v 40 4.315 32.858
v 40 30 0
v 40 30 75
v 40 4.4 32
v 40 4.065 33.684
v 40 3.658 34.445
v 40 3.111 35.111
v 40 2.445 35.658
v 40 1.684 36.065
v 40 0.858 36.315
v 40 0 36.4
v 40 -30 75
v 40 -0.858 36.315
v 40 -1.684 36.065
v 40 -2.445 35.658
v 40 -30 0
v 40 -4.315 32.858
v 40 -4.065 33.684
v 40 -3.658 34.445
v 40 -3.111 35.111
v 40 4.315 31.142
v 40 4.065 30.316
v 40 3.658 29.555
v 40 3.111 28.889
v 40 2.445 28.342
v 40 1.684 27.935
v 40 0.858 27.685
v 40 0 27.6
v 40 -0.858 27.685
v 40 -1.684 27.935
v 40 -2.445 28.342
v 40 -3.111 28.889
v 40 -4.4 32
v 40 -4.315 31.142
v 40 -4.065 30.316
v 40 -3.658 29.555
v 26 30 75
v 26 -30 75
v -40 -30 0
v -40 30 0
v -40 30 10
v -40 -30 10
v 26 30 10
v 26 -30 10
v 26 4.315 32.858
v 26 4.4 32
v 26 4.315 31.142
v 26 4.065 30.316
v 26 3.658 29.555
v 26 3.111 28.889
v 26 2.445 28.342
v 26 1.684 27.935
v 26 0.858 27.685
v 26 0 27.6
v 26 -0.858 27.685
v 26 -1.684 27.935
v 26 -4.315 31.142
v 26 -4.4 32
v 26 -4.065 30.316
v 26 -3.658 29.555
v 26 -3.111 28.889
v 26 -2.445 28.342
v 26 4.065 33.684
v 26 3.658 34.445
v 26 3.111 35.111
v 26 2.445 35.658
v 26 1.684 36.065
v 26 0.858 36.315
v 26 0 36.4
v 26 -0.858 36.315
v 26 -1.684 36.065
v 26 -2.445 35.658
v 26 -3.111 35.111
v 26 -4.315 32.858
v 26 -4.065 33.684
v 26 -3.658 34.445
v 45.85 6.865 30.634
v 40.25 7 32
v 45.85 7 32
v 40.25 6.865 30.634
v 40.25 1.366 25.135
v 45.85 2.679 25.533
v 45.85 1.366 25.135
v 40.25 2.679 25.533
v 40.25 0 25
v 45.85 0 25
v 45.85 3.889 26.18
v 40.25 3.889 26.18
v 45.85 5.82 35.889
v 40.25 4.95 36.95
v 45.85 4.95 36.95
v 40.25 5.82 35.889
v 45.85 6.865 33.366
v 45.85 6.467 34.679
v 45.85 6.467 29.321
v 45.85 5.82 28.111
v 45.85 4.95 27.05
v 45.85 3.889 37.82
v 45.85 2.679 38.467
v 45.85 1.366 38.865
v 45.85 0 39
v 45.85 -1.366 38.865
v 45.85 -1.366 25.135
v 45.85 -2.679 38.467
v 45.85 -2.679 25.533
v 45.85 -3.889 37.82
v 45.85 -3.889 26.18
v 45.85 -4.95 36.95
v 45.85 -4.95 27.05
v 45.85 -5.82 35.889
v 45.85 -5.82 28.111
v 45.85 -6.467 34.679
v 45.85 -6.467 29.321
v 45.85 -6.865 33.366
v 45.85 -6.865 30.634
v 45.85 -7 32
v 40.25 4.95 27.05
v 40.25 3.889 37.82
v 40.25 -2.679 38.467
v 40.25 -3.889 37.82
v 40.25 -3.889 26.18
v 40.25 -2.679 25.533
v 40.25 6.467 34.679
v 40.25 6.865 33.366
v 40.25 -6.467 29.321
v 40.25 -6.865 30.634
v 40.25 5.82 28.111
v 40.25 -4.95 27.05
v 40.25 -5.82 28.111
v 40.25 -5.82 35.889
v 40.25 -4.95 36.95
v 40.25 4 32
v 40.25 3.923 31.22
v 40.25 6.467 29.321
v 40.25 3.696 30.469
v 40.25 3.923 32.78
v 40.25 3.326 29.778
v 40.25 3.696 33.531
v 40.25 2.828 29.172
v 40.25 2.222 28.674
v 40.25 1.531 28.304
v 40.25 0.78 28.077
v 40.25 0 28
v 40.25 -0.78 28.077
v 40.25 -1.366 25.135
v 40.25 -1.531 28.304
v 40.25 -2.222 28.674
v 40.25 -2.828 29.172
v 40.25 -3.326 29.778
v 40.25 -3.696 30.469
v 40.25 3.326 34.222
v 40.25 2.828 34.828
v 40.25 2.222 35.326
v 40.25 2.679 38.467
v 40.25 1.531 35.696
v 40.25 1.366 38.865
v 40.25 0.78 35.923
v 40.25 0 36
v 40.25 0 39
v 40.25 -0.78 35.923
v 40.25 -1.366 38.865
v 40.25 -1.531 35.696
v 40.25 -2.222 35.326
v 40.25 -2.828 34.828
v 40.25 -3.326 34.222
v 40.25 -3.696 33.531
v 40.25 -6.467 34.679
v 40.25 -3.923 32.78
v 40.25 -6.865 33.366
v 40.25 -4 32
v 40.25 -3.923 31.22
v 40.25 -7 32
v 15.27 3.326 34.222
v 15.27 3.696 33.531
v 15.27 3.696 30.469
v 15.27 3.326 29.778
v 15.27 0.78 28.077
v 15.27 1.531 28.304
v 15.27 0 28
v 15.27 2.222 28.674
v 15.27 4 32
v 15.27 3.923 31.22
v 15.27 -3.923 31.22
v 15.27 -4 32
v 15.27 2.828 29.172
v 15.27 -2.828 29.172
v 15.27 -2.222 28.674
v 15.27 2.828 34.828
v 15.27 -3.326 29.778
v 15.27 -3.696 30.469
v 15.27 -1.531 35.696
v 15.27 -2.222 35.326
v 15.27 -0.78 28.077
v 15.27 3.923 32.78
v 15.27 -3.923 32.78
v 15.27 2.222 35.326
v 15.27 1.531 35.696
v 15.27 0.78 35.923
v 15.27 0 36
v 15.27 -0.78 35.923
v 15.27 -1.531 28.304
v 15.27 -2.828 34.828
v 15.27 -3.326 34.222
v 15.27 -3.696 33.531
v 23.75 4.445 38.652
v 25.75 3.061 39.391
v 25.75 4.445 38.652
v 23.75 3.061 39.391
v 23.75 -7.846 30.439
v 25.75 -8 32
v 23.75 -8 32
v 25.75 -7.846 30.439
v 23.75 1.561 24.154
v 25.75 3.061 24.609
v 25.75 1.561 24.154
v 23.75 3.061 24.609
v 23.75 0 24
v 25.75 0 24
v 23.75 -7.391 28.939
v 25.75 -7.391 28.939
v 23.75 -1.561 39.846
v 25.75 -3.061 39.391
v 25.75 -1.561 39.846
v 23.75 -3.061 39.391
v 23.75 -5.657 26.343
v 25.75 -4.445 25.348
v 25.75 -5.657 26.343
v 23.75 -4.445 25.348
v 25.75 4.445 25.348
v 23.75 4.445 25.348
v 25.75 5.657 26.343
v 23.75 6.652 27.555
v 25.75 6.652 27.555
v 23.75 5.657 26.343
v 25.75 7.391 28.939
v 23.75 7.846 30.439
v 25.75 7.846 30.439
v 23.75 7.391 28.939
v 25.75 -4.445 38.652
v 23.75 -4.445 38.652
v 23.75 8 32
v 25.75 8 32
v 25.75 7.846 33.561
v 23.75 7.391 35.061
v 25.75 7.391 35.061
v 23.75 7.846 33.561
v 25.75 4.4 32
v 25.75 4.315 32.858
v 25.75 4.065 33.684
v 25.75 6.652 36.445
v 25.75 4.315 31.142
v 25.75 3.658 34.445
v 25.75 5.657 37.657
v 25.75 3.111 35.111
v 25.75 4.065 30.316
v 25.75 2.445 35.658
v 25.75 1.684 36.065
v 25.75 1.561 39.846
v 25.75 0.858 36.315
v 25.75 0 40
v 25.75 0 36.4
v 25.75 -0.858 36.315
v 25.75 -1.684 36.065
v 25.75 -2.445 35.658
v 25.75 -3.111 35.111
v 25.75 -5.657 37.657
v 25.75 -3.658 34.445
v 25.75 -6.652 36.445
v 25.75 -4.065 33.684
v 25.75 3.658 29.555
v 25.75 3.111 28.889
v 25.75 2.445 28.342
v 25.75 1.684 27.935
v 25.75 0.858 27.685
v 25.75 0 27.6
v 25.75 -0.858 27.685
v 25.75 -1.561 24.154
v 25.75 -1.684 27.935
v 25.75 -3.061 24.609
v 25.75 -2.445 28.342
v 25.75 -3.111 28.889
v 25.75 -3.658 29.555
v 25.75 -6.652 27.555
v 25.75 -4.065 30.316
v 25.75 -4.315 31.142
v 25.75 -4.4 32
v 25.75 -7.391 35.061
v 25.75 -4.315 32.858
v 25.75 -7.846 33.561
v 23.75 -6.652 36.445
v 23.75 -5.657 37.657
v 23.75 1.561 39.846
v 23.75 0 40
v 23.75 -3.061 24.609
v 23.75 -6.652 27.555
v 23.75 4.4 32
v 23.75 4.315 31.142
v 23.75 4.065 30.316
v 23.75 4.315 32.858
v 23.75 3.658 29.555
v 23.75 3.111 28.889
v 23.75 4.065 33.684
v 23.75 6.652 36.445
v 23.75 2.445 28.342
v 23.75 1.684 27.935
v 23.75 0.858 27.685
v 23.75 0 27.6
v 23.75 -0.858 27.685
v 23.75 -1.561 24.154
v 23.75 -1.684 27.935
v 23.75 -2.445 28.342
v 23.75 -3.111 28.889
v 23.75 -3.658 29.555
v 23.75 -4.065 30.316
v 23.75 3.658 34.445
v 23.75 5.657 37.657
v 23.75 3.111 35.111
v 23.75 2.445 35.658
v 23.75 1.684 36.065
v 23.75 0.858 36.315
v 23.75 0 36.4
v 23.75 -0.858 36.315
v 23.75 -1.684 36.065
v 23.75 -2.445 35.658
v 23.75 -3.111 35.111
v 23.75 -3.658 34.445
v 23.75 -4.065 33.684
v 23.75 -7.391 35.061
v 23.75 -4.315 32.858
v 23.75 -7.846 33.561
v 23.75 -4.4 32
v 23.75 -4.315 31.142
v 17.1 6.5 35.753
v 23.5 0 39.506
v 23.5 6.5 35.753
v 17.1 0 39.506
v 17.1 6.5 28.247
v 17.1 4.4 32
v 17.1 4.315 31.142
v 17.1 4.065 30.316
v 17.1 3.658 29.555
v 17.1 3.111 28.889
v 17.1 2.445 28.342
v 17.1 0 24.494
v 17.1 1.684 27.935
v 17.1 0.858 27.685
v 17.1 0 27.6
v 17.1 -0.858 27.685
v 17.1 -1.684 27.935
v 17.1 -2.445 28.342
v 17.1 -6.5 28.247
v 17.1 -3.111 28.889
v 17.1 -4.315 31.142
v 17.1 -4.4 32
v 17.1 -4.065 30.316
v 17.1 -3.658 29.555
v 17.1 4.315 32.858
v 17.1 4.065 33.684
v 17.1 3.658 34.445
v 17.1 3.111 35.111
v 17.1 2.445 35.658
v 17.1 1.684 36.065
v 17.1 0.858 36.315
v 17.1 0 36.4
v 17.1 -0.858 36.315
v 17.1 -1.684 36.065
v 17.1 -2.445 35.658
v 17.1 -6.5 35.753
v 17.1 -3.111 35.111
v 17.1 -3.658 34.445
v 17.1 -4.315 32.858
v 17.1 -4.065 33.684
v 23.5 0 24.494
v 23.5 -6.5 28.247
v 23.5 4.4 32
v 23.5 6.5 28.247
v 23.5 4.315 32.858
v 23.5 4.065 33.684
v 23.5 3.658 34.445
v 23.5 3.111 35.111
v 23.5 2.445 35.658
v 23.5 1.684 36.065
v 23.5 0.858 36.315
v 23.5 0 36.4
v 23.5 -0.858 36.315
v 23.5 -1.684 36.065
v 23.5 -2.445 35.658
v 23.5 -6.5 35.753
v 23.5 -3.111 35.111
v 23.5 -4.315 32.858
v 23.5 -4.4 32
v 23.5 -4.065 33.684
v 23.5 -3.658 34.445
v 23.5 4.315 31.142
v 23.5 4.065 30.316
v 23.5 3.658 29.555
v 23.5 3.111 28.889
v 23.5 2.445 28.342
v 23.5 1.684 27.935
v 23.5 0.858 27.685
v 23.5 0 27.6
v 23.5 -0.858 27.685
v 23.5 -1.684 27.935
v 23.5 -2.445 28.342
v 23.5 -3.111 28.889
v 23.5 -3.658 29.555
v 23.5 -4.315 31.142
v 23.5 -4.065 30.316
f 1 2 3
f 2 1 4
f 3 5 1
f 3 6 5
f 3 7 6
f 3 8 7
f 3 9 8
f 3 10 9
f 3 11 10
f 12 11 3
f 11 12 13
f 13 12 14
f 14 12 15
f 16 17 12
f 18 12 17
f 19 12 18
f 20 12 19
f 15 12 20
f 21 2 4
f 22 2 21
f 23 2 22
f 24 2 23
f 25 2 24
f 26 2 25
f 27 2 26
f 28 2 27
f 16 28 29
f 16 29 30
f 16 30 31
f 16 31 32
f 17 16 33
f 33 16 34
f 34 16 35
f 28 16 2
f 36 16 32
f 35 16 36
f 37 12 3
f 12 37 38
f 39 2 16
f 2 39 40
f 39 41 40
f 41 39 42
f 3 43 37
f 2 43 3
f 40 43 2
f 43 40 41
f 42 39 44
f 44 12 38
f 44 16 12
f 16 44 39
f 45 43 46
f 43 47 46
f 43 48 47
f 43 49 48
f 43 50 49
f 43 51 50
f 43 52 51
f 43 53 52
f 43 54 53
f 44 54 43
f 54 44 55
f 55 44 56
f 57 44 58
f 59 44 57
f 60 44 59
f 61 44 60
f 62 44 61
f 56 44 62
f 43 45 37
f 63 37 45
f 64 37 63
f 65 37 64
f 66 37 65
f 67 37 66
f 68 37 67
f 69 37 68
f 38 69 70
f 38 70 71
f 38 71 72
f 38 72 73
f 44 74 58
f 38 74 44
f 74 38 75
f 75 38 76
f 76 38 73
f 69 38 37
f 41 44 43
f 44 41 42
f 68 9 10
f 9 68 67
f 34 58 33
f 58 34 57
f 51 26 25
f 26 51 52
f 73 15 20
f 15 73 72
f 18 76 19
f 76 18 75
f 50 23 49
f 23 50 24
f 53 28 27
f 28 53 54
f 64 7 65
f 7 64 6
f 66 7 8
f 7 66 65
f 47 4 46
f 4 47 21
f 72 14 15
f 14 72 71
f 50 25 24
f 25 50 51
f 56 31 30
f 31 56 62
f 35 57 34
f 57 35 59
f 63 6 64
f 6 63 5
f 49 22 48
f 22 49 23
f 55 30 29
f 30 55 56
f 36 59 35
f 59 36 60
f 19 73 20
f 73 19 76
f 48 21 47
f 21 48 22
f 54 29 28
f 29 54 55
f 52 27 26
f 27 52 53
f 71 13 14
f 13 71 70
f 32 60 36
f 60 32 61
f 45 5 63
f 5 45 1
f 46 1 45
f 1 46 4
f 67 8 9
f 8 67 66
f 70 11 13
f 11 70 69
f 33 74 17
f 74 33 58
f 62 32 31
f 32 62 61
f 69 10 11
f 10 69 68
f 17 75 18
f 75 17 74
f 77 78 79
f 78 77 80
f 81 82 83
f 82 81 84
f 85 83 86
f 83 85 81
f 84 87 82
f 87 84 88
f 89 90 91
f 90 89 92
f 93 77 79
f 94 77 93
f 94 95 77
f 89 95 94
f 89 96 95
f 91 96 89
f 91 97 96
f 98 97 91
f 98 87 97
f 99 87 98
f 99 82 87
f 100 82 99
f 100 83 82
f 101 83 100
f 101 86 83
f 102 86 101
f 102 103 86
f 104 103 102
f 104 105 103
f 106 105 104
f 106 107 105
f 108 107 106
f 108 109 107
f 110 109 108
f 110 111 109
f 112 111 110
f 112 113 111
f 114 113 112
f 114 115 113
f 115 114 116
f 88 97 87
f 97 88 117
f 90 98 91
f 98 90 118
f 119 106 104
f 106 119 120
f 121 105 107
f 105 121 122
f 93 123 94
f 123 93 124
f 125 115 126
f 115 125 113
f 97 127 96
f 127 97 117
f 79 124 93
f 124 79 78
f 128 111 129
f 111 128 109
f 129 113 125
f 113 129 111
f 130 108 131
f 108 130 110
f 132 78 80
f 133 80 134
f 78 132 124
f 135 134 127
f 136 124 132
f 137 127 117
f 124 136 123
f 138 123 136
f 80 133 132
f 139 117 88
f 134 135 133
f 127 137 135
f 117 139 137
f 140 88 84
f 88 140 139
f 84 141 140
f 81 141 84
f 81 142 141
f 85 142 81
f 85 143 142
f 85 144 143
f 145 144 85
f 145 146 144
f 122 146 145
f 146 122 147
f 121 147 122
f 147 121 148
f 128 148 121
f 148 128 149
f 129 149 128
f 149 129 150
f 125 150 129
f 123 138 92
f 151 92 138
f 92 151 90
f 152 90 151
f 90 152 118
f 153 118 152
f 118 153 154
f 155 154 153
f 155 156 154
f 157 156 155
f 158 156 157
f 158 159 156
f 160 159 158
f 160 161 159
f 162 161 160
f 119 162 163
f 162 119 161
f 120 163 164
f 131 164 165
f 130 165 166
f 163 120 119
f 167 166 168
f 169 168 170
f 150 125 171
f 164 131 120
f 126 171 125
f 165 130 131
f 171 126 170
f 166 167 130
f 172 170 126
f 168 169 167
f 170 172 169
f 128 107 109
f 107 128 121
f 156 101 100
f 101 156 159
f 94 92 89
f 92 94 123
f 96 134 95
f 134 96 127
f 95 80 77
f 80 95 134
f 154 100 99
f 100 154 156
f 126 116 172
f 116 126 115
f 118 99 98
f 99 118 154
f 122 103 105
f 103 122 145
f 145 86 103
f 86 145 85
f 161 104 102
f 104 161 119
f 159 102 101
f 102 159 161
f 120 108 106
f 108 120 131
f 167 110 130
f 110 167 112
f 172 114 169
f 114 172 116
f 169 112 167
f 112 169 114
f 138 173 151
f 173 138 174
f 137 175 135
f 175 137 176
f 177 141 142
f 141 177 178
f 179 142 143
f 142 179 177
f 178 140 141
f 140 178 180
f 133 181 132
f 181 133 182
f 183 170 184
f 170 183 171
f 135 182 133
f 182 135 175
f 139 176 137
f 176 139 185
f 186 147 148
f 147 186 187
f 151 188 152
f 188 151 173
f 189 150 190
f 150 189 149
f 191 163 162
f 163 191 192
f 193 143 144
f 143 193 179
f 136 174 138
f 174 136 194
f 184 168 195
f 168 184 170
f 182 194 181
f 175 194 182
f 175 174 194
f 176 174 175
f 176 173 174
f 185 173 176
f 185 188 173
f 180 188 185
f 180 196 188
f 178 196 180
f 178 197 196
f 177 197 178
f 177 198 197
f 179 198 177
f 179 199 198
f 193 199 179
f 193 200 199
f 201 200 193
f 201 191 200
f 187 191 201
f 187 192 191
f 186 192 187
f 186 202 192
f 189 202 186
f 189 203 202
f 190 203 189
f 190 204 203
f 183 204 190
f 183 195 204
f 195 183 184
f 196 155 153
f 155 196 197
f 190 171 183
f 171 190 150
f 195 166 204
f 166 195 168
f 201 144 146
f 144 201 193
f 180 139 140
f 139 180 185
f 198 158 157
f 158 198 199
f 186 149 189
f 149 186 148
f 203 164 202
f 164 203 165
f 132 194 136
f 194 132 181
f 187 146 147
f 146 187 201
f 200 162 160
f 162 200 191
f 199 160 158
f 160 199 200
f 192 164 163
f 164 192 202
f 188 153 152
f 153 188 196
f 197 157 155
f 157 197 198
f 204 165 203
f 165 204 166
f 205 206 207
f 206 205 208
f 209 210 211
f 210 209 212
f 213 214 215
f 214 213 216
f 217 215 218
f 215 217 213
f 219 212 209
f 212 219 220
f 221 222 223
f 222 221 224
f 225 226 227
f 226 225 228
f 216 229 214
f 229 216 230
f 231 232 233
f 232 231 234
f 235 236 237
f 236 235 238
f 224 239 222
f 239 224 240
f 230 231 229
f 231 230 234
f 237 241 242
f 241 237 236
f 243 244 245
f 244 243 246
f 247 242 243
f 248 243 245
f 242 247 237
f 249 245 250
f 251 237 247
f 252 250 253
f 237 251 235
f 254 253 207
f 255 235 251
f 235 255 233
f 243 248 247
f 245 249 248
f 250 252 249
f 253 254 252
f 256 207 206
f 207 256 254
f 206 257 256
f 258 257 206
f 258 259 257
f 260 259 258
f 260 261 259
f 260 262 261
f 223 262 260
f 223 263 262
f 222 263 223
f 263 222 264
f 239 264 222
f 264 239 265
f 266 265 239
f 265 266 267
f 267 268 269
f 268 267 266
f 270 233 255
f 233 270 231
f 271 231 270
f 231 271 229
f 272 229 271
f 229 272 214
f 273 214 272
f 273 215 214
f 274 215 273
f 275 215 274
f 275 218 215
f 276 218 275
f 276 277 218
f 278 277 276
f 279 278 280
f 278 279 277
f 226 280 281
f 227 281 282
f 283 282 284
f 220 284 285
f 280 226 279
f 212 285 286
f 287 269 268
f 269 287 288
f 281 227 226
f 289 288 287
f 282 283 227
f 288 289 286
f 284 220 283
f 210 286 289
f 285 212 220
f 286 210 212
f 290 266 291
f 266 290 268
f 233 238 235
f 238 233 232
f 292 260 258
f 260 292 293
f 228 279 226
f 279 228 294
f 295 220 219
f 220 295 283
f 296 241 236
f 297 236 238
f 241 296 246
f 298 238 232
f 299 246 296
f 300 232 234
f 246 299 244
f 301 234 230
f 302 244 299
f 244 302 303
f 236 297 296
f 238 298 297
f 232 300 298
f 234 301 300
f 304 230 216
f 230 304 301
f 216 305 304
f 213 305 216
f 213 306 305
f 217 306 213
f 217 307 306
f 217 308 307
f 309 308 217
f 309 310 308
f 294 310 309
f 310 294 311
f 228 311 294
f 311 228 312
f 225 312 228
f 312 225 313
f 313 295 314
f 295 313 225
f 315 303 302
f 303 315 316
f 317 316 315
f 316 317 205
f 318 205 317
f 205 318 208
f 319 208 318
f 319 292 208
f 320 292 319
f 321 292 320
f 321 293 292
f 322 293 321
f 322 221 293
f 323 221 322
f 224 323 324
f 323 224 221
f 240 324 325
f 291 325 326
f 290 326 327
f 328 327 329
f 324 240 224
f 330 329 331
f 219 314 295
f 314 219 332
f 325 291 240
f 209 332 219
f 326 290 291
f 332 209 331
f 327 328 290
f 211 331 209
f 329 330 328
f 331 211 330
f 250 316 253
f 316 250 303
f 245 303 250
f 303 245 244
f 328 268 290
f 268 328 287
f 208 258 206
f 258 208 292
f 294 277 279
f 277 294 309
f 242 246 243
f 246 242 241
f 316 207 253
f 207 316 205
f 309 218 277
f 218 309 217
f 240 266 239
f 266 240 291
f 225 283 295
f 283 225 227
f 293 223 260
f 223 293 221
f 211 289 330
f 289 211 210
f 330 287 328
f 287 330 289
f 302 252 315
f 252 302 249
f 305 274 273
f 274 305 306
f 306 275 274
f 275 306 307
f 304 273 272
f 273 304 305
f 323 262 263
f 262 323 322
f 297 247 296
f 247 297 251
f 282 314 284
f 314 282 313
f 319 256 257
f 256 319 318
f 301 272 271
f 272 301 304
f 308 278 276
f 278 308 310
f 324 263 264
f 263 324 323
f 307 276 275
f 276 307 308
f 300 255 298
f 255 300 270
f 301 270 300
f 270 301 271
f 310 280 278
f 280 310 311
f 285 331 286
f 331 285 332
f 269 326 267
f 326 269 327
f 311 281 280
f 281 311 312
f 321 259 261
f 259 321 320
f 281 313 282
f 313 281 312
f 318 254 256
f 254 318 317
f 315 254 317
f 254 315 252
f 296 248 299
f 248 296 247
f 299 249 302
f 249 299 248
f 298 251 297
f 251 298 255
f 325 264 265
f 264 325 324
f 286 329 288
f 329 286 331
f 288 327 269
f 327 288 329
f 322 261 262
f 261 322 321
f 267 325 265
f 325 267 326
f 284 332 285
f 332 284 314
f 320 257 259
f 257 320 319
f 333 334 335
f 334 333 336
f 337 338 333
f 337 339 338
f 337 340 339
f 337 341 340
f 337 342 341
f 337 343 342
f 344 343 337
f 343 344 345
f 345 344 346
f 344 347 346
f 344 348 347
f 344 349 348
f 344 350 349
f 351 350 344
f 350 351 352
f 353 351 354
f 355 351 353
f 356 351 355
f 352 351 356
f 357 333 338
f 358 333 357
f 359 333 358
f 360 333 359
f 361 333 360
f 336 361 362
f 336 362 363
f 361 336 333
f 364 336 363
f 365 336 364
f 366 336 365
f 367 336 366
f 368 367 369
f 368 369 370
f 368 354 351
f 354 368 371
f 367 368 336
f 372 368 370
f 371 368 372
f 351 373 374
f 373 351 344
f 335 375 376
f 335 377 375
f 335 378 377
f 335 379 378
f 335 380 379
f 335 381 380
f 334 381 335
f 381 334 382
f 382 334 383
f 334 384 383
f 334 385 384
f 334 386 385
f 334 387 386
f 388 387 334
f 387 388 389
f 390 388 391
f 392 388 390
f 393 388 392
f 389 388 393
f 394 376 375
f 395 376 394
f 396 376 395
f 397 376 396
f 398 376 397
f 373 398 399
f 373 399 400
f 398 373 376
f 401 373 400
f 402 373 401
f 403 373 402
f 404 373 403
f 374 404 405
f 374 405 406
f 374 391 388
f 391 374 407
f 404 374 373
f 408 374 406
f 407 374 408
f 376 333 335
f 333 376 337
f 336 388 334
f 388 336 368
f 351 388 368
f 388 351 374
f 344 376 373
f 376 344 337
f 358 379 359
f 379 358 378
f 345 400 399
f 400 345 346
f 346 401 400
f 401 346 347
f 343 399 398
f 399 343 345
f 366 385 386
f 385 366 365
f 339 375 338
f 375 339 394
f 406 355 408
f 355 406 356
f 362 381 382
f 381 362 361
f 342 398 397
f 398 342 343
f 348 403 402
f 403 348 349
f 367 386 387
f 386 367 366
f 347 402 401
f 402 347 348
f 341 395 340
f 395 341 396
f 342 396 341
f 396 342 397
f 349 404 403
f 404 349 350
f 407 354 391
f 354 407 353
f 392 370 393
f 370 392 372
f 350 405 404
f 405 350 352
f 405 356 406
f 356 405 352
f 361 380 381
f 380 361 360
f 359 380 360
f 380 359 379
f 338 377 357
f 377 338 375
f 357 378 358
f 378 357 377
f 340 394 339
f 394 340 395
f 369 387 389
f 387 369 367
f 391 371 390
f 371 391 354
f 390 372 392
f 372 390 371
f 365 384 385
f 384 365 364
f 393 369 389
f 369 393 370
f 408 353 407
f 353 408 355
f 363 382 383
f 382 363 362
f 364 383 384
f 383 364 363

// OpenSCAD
$fn = 32;

// ------------------------------------------------------------------------
// Bolted bracket: 80 x 60 mm bracket with 1 bolt joints
// Every part is its own module, assembly() places them once.
// ------------------------------------------------------------------------

// --- part 1 ---
module bracket() {
  difference() {
    translate([-40, -30, 0]) cube([80, 60, 75]);
    translate([-41, -31, 10]) cube([67, 62, 66]);
    translate([33, 0, 32]) rotate([0, 90, 0]) cylinder(h = 16, d = 8.8, center = true);
  }
}

// --- part 2 ---
module bolt() {
  cylinder(h = 5.6, d = 14);
  translate([0, 0, -24.98]) cylinder(h = 24.98, d = 8);
}

// --- part 3 ---
module washer() {
  difference() {
      translate([0, 0, 0]) cylinder(h = 2, d = 16);
      translate([0, 0, -1]) cylinder(h = 4, d = 8.8);
    }
}

// --- part 4 ---
module nut() {
  difference() {
    linear_extrude(height = 6.4) polygon(points = [[7.506, 0], [3.753, 6.5], [-3.753, 6.5], [-7.506, 0], [-3.753, -6.5], [3.753, -6.5]]);
    translate([0, 0, -1]) cylinder(h = 8.4, d = 8.8);
  }
}

// --- assembly ---
module assembly() {
  translate([0, 0, 0]) rotate([0, 0, 0]) bracket();
  translate([40.25, 0, 32]) rotate([0, 90, 0]) bolt();
  translate([23.75, 0, 32]) rotate([0, 90, 0]) washer();
  translate([17.1, 0, 32]) rotate([0, 90, 0]) nut();
}

assembly();
